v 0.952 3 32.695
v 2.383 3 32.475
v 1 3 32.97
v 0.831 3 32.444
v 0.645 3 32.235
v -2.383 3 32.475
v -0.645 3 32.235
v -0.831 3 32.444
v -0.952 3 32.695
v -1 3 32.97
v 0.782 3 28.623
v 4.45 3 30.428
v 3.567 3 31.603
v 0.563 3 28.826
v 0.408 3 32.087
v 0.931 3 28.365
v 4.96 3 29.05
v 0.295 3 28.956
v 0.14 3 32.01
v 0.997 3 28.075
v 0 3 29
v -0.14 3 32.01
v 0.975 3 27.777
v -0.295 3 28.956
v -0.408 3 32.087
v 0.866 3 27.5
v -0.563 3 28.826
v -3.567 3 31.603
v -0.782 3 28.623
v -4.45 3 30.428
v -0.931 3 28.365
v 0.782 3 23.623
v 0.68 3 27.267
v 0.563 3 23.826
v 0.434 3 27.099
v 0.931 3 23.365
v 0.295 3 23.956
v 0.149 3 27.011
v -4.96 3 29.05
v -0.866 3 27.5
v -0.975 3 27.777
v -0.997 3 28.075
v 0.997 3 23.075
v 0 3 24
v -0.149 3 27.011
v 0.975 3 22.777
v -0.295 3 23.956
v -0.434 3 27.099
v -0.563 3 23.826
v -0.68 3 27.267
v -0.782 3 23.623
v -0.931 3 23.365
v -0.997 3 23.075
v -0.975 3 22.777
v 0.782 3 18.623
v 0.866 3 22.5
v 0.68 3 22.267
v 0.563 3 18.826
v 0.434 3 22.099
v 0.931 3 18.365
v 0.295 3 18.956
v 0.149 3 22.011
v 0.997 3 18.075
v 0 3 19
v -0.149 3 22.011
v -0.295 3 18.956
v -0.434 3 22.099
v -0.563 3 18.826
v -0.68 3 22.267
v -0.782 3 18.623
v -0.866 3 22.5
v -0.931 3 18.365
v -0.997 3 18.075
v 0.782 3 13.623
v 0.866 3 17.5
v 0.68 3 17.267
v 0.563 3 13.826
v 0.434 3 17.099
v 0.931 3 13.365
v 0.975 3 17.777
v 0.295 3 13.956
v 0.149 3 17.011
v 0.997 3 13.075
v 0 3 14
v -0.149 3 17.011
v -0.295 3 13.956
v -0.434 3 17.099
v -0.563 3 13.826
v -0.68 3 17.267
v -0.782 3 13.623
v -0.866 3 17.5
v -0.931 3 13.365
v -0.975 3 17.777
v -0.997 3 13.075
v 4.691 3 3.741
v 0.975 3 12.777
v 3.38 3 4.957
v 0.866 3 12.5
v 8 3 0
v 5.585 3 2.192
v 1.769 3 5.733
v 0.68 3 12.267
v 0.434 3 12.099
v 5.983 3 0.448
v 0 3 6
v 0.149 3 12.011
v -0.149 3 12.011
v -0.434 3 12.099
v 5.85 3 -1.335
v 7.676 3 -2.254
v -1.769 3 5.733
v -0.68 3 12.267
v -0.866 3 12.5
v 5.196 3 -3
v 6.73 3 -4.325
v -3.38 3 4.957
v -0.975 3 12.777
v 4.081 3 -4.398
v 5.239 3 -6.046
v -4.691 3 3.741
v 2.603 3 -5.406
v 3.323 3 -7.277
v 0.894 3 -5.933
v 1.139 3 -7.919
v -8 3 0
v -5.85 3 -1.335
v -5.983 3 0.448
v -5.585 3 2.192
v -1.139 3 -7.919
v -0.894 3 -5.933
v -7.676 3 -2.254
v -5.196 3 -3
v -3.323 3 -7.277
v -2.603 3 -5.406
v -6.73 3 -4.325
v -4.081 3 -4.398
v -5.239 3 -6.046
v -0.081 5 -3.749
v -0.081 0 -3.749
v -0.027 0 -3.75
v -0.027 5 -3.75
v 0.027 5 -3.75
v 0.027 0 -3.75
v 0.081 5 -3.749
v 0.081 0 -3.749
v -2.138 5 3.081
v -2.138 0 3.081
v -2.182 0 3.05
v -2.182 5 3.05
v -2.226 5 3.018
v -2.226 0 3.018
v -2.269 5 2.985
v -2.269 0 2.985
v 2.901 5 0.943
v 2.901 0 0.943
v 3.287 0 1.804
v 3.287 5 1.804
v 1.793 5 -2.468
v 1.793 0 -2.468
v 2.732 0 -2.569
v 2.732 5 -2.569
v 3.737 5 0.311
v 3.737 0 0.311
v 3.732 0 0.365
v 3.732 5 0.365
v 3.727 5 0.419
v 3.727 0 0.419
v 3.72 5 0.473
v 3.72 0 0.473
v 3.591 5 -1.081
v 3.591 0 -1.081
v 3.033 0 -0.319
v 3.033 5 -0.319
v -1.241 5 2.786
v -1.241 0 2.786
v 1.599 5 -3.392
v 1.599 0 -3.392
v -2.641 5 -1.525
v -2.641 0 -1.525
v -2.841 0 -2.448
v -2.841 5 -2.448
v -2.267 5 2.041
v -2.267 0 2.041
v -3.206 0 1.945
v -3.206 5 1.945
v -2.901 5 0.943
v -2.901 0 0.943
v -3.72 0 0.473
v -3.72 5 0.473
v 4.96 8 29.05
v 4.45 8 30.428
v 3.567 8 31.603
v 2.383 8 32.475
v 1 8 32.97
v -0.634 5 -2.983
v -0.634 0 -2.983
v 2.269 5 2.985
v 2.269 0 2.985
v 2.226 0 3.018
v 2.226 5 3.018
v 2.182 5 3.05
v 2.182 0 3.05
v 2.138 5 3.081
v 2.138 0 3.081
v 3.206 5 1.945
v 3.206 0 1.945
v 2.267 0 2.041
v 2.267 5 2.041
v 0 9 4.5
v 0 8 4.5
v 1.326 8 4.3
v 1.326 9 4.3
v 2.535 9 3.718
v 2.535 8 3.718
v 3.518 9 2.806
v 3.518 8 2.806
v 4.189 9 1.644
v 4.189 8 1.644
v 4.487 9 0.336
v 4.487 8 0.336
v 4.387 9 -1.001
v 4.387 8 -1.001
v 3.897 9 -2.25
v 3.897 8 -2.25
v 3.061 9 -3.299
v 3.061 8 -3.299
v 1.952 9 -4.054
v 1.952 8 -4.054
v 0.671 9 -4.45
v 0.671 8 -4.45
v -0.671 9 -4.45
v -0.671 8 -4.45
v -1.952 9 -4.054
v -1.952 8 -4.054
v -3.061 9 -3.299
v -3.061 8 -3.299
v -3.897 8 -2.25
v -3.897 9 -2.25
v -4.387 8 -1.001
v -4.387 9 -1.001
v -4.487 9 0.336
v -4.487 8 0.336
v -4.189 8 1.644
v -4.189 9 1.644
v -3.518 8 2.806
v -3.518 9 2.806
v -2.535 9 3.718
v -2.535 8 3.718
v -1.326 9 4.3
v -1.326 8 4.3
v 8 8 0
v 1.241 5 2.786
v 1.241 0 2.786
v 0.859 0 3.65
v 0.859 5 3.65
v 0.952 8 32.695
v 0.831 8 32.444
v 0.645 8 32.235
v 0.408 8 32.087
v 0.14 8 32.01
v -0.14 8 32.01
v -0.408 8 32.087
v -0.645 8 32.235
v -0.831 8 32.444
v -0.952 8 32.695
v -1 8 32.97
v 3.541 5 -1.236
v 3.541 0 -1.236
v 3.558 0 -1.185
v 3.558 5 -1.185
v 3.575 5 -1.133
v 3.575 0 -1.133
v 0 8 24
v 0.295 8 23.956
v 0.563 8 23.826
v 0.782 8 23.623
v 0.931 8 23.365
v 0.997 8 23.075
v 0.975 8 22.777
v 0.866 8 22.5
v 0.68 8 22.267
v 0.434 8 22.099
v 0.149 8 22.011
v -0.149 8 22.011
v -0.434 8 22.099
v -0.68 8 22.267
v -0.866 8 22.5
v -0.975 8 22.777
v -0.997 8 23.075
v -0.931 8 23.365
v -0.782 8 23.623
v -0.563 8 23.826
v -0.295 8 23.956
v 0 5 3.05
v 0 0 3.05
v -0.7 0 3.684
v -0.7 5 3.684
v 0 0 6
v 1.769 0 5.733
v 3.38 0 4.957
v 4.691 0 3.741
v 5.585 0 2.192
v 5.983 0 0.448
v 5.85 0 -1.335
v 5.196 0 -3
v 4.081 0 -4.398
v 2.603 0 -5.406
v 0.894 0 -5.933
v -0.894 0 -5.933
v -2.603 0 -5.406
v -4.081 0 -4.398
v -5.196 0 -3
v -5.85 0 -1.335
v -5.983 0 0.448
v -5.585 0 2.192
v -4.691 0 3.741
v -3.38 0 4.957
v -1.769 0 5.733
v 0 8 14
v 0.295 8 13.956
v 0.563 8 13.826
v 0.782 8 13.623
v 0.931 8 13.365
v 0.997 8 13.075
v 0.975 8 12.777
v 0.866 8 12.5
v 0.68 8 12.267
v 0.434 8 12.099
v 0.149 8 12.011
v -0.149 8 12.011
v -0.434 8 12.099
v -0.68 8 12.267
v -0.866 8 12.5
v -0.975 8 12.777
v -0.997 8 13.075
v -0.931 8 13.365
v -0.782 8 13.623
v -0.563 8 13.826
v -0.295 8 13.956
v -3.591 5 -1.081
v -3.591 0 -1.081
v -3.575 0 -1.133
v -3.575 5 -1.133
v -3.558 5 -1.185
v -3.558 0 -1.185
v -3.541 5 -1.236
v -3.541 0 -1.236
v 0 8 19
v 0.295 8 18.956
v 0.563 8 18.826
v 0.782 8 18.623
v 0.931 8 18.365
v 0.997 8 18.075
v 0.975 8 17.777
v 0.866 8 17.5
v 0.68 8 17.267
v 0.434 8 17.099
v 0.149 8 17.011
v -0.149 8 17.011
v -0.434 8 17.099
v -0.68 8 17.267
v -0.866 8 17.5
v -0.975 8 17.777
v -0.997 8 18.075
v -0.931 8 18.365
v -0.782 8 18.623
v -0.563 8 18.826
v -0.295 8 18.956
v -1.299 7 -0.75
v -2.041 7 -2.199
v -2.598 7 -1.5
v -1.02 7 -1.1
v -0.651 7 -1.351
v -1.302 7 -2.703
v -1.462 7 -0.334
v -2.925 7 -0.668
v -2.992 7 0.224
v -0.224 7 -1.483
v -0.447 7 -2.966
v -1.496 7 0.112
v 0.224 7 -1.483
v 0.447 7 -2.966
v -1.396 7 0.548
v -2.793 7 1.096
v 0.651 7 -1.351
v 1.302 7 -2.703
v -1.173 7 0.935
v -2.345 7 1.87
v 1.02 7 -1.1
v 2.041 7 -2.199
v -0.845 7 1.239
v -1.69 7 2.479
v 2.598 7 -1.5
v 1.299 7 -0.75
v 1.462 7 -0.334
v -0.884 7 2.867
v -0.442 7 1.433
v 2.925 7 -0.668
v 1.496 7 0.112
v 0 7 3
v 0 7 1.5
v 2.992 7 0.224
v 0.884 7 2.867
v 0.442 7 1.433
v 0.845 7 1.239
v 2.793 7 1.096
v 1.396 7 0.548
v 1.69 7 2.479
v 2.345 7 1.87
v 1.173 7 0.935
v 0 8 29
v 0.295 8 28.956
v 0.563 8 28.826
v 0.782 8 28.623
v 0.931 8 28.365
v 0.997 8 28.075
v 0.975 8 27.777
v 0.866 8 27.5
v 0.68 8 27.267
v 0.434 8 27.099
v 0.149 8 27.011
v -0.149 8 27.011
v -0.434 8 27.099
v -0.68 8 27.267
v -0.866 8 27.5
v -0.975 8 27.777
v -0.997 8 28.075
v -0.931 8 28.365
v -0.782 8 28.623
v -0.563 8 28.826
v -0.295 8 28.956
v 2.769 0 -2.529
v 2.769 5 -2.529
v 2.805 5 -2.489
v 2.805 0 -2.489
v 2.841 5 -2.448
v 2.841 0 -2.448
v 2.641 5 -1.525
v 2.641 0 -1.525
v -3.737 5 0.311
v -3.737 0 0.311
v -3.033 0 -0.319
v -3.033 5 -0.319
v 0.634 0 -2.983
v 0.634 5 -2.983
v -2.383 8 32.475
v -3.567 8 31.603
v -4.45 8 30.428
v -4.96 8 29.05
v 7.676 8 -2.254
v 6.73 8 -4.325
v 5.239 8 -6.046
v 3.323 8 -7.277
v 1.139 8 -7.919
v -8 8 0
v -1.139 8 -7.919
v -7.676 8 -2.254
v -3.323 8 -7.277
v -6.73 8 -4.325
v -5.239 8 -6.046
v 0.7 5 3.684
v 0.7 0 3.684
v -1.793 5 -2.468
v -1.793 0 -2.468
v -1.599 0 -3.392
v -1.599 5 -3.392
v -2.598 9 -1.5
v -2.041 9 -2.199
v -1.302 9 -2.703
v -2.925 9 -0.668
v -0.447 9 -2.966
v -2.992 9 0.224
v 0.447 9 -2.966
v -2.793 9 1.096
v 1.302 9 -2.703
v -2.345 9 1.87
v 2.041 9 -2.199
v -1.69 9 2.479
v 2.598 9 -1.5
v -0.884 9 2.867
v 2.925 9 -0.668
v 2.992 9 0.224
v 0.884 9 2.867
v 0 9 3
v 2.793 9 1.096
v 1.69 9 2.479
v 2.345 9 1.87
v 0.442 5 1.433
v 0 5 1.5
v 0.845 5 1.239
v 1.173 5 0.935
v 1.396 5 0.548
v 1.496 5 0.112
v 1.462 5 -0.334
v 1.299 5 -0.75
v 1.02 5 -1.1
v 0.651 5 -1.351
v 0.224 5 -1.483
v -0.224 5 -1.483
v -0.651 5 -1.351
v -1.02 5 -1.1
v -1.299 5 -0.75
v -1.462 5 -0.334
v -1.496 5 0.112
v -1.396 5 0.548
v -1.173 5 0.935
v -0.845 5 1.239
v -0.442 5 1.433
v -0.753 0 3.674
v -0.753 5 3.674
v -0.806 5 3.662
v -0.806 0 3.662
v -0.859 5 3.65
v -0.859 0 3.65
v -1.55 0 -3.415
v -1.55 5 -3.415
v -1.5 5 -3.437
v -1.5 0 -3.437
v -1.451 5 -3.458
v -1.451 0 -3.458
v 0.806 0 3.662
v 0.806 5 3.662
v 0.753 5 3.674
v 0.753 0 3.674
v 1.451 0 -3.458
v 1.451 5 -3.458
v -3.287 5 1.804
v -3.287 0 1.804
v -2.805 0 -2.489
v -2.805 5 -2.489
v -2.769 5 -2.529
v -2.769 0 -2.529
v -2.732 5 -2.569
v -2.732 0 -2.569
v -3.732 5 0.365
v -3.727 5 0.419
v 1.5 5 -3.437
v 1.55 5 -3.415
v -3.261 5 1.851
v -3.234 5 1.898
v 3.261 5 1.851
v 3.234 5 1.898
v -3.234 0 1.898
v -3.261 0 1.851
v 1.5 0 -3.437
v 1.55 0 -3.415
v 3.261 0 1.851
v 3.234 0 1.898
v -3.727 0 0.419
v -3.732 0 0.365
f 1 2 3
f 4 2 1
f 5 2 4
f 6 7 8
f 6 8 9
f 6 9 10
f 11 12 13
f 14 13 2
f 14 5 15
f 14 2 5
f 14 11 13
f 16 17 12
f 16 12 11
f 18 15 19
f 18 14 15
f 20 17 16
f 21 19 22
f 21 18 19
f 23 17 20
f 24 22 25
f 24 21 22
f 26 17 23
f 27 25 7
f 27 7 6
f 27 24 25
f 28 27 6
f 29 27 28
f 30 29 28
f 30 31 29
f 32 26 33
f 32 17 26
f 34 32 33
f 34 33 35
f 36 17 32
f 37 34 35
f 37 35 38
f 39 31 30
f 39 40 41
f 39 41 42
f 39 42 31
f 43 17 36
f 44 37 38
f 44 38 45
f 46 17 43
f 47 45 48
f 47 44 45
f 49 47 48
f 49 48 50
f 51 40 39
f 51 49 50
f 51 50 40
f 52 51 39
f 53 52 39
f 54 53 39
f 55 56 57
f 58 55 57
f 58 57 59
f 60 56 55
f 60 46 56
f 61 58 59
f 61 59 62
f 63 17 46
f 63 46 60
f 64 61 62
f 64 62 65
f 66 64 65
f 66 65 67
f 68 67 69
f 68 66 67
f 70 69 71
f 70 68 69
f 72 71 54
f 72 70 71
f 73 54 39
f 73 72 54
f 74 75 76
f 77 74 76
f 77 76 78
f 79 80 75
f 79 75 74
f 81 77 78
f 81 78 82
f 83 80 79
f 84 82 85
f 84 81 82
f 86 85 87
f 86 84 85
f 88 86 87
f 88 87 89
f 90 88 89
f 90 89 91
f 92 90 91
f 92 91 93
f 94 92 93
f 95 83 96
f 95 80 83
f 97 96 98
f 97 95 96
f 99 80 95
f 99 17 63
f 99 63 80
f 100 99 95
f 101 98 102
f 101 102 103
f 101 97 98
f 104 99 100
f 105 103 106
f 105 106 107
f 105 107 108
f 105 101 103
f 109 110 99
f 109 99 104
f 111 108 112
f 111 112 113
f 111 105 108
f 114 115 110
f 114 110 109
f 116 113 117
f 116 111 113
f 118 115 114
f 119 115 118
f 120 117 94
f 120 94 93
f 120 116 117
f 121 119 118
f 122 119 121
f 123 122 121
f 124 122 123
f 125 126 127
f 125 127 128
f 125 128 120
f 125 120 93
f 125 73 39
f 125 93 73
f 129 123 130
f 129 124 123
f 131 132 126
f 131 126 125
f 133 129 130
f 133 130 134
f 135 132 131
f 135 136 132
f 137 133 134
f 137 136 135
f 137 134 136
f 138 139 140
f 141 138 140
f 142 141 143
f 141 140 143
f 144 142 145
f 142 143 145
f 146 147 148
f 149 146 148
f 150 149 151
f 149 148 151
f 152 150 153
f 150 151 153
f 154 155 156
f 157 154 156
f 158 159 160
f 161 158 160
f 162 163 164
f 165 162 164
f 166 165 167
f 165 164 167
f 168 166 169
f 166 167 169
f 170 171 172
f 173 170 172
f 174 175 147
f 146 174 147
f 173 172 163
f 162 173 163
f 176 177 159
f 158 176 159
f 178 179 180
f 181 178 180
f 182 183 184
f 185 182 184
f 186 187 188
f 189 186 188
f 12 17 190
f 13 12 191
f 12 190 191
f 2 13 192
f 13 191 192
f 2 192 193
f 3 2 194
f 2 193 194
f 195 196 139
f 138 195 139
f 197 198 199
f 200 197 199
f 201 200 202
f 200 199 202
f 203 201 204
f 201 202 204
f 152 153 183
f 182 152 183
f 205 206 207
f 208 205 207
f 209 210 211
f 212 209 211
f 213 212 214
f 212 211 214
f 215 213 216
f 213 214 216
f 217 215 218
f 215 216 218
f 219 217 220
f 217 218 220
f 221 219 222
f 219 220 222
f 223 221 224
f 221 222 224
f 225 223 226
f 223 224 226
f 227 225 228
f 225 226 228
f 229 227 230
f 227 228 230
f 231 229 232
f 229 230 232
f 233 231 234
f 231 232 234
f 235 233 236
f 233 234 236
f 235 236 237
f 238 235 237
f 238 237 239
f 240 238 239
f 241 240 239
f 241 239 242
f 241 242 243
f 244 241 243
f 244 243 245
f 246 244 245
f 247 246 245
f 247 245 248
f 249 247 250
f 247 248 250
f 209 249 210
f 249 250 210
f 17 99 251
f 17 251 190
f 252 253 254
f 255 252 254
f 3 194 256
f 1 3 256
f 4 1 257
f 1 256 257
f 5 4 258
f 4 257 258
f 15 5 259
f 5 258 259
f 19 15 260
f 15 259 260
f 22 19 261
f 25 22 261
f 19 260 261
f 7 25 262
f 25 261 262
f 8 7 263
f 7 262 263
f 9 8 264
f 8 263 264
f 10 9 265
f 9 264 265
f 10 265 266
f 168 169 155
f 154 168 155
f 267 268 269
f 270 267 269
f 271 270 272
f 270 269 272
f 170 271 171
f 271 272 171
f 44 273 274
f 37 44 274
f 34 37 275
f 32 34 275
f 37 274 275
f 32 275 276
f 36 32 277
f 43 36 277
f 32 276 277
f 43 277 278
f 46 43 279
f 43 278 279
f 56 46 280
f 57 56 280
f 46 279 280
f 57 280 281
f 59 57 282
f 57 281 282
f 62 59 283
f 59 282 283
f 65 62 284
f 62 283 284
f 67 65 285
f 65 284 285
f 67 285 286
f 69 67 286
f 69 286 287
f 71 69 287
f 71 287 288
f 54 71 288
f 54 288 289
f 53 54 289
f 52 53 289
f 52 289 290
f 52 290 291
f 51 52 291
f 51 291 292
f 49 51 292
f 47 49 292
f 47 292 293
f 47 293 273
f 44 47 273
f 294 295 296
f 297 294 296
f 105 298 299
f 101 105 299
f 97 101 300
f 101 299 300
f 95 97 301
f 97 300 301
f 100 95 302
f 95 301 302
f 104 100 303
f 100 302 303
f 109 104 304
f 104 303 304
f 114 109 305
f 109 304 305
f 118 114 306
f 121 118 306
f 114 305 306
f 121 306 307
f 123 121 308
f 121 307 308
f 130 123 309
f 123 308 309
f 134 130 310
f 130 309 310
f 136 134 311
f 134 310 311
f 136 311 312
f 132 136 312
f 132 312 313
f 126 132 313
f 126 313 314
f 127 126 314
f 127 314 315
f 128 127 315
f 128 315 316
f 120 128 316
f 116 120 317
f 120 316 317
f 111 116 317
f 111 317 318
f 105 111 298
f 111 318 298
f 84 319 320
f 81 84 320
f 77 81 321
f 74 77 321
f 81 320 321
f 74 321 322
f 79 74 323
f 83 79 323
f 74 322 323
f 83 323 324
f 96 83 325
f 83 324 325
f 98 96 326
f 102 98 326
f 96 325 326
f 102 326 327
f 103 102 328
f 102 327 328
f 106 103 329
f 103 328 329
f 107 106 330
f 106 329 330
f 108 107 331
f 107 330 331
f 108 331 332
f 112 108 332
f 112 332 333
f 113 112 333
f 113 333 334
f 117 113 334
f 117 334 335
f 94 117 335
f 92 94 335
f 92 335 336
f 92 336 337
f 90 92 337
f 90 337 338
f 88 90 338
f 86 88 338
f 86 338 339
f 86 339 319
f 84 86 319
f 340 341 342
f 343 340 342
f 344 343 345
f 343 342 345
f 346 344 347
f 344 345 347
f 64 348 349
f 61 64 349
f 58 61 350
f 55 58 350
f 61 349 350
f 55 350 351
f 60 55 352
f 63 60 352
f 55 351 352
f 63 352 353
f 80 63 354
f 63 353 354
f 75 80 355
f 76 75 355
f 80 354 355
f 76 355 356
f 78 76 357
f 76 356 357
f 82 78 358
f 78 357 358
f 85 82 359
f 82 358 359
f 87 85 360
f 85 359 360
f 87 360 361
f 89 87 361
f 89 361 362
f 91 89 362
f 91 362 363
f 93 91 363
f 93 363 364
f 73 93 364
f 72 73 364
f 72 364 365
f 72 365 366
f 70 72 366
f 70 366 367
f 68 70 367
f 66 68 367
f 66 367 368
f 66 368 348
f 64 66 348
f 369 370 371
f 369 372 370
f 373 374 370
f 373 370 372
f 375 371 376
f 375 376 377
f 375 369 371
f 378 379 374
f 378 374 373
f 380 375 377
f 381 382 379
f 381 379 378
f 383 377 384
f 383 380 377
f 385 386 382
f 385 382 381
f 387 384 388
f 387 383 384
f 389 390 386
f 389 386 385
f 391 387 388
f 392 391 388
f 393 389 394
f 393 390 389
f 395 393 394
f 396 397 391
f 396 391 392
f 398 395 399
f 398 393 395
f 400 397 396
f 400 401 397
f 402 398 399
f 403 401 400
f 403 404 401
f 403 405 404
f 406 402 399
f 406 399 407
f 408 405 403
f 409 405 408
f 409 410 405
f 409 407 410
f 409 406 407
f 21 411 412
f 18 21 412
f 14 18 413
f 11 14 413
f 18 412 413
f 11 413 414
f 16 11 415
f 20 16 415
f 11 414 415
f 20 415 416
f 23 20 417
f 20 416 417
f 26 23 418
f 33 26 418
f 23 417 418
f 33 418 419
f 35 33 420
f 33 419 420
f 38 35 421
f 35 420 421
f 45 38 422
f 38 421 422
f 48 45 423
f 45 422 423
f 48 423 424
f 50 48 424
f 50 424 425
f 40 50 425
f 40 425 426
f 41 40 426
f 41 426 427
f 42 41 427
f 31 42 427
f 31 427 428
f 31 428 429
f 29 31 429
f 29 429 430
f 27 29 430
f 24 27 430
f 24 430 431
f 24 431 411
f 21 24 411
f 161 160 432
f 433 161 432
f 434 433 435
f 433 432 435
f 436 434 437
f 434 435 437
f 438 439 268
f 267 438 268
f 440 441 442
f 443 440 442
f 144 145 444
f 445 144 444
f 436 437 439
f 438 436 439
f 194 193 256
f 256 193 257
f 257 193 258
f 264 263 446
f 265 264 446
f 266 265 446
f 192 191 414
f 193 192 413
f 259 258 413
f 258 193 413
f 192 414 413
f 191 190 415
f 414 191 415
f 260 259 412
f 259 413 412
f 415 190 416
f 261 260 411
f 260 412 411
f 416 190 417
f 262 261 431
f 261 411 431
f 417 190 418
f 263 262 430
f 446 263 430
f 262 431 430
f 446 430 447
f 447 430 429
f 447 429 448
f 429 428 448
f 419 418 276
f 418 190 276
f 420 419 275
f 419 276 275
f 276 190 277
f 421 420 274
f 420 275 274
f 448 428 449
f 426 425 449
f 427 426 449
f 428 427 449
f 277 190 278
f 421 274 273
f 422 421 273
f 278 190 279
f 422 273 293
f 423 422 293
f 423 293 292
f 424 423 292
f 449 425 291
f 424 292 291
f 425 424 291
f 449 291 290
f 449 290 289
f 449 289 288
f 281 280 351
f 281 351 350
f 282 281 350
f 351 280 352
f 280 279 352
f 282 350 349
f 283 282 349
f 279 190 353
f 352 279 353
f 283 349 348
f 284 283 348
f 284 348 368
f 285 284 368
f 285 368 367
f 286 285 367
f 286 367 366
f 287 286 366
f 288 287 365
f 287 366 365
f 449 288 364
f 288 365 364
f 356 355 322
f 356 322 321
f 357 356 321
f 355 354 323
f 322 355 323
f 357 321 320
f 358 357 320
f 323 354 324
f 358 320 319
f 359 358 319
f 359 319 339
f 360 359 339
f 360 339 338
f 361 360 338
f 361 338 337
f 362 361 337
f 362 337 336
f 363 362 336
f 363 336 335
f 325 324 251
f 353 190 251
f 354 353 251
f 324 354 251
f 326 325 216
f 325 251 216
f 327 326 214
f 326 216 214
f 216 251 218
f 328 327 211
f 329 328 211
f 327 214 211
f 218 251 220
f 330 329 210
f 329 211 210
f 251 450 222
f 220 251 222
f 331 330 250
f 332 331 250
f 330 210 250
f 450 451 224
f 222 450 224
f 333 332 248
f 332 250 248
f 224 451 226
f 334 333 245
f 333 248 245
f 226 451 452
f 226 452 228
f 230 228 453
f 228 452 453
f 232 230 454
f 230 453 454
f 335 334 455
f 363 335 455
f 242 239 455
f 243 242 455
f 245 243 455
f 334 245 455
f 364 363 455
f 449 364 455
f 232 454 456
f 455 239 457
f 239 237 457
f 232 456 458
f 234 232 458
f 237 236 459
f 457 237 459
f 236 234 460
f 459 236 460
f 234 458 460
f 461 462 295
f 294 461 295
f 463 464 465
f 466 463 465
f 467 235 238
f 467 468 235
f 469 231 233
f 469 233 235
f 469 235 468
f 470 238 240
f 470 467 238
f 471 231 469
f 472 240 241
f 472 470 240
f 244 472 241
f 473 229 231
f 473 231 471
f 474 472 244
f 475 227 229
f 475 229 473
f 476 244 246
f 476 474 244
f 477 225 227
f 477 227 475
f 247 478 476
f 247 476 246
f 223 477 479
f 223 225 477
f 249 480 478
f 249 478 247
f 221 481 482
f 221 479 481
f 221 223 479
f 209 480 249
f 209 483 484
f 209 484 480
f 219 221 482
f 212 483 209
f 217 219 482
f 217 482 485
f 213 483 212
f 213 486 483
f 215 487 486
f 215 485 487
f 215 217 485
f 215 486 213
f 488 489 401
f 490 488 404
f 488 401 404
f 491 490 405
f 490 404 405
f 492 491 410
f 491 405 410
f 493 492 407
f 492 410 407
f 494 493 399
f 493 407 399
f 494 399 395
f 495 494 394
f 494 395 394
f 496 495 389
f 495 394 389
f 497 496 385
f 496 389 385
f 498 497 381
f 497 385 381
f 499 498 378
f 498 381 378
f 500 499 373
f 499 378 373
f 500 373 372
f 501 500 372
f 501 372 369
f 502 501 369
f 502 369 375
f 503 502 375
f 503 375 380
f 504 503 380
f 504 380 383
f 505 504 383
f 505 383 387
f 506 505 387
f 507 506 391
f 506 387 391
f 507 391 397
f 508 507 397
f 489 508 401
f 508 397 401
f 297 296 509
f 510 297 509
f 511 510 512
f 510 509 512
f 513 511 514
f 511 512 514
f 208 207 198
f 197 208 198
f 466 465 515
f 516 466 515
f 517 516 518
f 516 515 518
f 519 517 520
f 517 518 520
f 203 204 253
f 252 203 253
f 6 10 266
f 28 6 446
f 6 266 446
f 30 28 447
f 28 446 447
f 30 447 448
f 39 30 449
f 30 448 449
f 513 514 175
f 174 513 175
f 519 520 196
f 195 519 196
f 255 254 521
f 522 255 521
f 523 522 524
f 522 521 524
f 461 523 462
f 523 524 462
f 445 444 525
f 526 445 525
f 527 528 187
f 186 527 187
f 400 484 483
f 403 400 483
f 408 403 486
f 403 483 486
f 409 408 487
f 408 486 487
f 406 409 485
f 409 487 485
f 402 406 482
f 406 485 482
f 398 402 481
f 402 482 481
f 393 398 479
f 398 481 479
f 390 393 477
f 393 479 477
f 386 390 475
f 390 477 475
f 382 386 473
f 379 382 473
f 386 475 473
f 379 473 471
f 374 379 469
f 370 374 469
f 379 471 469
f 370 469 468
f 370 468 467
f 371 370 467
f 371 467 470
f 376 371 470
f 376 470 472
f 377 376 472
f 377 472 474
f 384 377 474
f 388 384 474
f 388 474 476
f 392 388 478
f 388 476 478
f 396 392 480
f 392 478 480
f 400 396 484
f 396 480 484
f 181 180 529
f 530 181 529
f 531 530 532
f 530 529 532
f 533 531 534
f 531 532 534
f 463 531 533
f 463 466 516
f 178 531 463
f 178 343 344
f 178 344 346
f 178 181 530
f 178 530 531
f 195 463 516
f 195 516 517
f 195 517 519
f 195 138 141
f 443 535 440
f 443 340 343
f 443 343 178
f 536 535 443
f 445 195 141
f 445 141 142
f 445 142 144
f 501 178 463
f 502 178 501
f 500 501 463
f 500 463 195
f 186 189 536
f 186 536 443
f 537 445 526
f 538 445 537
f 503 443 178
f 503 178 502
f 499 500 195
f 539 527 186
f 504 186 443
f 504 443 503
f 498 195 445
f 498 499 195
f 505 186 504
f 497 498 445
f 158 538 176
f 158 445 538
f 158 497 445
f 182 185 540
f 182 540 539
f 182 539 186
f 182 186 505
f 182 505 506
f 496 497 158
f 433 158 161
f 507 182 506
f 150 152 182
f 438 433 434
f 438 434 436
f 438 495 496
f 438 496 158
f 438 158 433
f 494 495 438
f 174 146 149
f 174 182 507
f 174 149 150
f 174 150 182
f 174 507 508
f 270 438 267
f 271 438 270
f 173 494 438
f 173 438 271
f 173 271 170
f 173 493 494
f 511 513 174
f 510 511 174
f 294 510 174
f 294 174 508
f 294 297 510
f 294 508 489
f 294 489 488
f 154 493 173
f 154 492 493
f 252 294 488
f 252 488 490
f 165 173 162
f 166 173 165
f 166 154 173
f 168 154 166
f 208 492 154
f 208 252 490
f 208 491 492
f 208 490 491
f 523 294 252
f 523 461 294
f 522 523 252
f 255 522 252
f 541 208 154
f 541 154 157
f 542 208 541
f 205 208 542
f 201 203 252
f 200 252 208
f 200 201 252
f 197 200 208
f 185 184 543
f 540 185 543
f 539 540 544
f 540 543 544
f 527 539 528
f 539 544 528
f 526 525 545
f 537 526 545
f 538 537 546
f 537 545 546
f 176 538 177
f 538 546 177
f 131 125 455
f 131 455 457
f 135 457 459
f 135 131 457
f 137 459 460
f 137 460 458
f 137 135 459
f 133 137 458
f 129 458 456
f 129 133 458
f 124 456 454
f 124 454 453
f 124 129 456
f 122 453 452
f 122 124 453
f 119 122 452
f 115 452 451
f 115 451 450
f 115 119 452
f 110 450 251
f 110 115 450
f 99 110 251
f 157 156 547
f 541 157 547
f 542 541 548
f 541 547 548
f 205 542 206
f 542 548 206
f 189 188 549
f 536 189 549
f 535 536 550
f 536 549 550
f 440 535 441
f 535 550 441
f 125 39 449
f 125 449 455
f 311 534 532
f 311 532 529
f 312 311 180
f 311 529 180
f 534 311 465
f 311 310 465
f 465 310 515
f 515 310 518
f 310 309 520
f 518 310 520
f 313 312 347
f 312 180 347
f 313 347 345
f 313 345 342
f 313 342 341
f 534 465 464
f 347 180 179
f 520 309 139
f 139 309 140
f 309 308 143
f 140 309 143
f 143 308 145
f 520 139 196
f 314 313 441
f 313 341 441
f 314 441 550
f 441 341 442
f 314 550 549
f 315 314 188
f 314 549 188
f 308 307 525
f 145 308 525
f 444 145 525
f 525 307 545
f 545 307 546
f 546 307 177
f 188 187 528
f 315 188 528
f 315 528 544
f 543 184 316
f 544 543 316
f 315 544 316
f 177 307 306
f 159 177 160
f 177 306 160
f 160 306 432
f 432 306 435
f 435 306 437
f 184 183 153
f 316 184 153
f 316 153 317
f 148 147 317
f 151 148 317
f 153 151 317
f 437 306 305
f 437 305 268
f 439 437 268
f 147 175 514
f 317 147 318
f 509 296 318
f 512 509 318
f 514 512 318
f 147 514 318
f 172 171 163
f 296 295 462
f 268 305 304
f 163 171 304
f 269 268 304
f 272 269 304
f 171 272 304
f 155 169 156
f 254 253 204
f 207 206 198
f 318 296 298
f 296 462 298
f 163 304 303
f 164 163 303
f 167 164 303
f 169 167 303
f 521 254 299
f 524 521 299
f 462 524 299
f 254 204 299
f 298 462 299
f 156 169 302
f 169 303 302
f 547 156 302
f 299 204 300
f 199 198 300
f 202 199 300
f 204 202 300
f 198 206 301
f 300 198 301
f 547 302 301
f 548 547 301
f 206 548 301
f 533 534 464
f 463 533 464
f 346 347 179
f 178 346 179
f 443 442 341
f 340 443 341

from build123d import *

# Parameters (mm, degrees)
SKETCH1_R           = 6
BOSS_EXTRUDE1_DEPTH = 3
CUT_EXTRUDE4_DEPTH  = 10
BOSS_EXTRUDE2_DEPTH = 5
SKETCH3_R           = 4.5
BOSS_EXTRUDE3_DEPTH = 1
SKETCH4_R           = 3
CUT_EXTRUDE1_DEPTH  = 2
SKETCH5_R           = 1.5
CUT_EXTRUDE2_DEPTH  = 48.699580711
SKETCH6_R           = 1
CUT_EXTRUDE3_DEPTH  = 10
SKETCH8_R           = 1.5
CUT_EXTRUDE5_DEPTH  = 2
SKETCH9_R           = 1
CUT_EXTRUDE6_DEPTH  = 10


with BuildPart() as part:
    # Sketch1 → Boss-Extrude1 (new body)
    with BuildSketch(Plane(origin=(0, 0, 0), x_dir=(1, 0, 0), z_dir=(0, 1, 0))):
        with Locations(Location((0, 0, 0), (0, 0, 270))):
            Circle(SKETCH1_R)
    extrude(amount=BOSS_EXTRUDE1_DEPTH)

    # Sketch7 → Cut-Extrude4 (cut, through all)
    with BuildSketch(Plane.XZ):
        with BuildLine():
            Line((0.7, 3.684087404), (0, 3.05))
            Line((0, 3.05), (-0.7, 3.684087404))
            ThreePointArc((-0.7, 3.684087404), (-0.779668841, 3.668053503), (-0.858971523, 3.650296964))
            Line((-0.858971523, 3.650296964), (-1.240546761, 2.786313646))
            Line((-1.240546761, 2.786313646), (-2.137935164, 3.080865663))
            ThreePointArc((-2.137935164, 3.080865663), (-2.204194696, 3.033813729), (-2.269419066, 2.985337016))
            Line((-2.269419066, 2.985337016), (-2.266591718, 2.040848349))
            Line((-2.266591718, 2.040848349), (-3.206201915, 1.944934261))
            ThreePointArc((-3.206201915, 1.944934261), (-3.247595264, 1.875), (-3.287463436, 1.804185178))
            Line((-3.287463436, 1.804185178), (-2.900722375, 0.942501833))
            Line((-2.900722375, 0.942501833), (-3.720087228, 0.472706055))
            ThreePointArc((-3.720087228, 0.472706055), (-3.729457108, 0.391981737), (-3.737075512, 0.311073332))
            Line((-3.737075512, 0.311073332), (-3.033291781, -0.318811813))
            Line((-3.033291781, -0.318811813), (-3.590735663, -1.081257322))
            ThreePointArc((-3.590735663, -1.081257322), (-3.566461936, -1.158813729), (-3.540513282, -1.235825919))
            Line((-3.540513282, -1.235825919), (-2.641377482, -1.525))
            Line((-2.641377482, -1.525), (-2.840513282, -2.448261485))
            ThreePointArc((-2.840513282, -2.448261485), (-2.786793096, -2.509239774), (-2.73176414, -2.569039642))
            Line((-2.73176414, -2.569039642), (-1.792745019, -2.467501833))
            Line((-1.792745019, -2.467501833), (-1.599140348, -3.391938995))
            ThreePointArc((-1.599140348, -3.391938995), (-1.525262412, -3.425795466), (-1.450668162, -3.458043072))
            Line((-1.450668162, -3.458043072), (-0.634130657, -2.983350182))
            Line((-0.634130657, -2.983350182), (-0.081261521, -3.749119439))
            ThreePointArc((-0.081261521, -3.749119439), (0, -3.75), (0.081261521, -3.749119439))
            Line((0.081261521, -3.749119439), (0.634130657, -2.983350182))
            Line((0.634130657, -2.983350182), (1.450668162, -3.458043072))
            ThreePointArc((1.450668162, -3.458043072), (1.525262412, -3.425795466), (1.599140348, -3.391938995))
            Line((1.599140348, -3.391938995), (1.792745019, -2.467501833))
            Line((1.792745019, -2.467501833), (2.73176414, -2.569039642))
            ThreePointArc((2.73176414, -2.569039642), (2.786793096, -2.509239774), (2.840513282, -2.448261485))
            Line((2.840513282, -2.448261485), (2.641377482, -1.525))
            Line((2.641377482, -1.525), (3.540513282, -1.235825919))
            ThreePointArc((3.540513282, -1.235825919), (3.566461936, -1.158813729), (3.590735663, -1.081257322))
            Line((3.590735663, -1.081257322), (3.033291781, -0.318811813))
            Line((3.033291781, -0.318811813), (3.737075512, 0.311073332))
            ThreePointArc((3.737075512, 0.311073332), (3.729457108, 0.391981737), (3.720087228, 0.472706055))
            Line((3.720087228, 0.472706055), (2.900722375, 0.942501833))
            Line((2.900722375, 0.942501833), (3.287463436, 1.804185178))
            ThreePointArc((3.287463436, 1.804185178), (3.247595264, 1.875), (3.206201915, 1.944934261))
            Line((3.206201915, 1.944934261), (2.266591718, 2.040848349))
            Line((2.266591718, 2.040848349), (2.269419066, 2.985337016))
            ThreePointArc((2.269419066, 2.985337016), (2.204194696, 3.033813729), (2.137935164, 3.080865663))
            Line((2.137935164, 3.080865663), (1.240546761, 2.786313646))
            Line((1.240546761, 2.786313646), (0.858971523, 3.650296964))
            ThreePointArc((0.858971523, 3.650296964), (0.779668841, 3.668053503), (0.7, 3.684087404))
        make_face()
    extrude(amount=-CUT_EXTRUDE4_DEPTH, mode=Mode.SUBTRACT)

    # Sketch2 → Boss-Extrude2 (add)
    with BuildSketch(Plane(origin=(0, 3, 0), x_dir=(1, 0, 0), z_dir=(0, 1, 0))):
        with BuildLine():
            Line((8, 0), (3.5, -43))
            ThreePointArc((3.5, -43), (0, -46.5), (-3.5, -43))
            Line((-3.5, -43), (-8, 0))
            ThreePointArc((-8, 0), (0, 8), (8, 0))
        make_face()
    extrude(amount=BOSS_EXTRUDE2_DEPTH)

    # Sketch3 → Boss-Extrude3 (add)
    with BuildSketch(Plane(origin=(0, 8, 0), x_dir=(1, 0, 0), z_dir=(0, 1, 0))):
        with Locations(Location((0, 0, 0), (0, 0, 270))):
            Circle(SKETCH3_R)
    extrude(amount=BOSS_EXTRUDE3_DEPTH)

    # Sketch4 → Cut-Extrude1 (cut)
    with BuildSketch(Plane(origin=(0, 9, 0), x_dir=(1, 0, 0), z_dir=(0, 1, 0))):
        with Locations(Location((0, 0, 0), (0, 0, 270))):
            Circle(SKETCH4_R)
    extrude(amount=-CUT_EXTRUDE1_DEPTH, mode=Mode.SUBTRACT)

    # Sketch5 → Cut-Extrude2 (cut, through all)
    with BuildSketch(Plane(origin=(0, 7, 0), x_dir=(1, 0, 0), z_dir=(0, 1, 0))):
        with Locations(Location((0, 0, 0), (0, 0, 270))):
            Circle(SKETCH5_R)
    extrude(amount=-CUT_EXTRUDE2_DEPTH, mode=Mode.SUBTRACT)

    # Sketch6 → Cut-Extrude3 (cut)
    with BuildSketch(Plane(origin=(0, 8, 0), x_dir=(1, 0, 0), z_dir=(0, 1, 0))):
        with Locations(Location((0, -13, 0), (0, 0, 270))):
            Circle(SKETCH6_R)
        with Locations(Location((0, -18, 0), (0, 0, 270))):
            Circle(SKETCH6_R)
        with Locations(Location((0, -23, 0), (0, 0, 270))):
            Circle(SKETCH6_R)
        with Locations(Location((0, -28, 0), (0, 0, 270))):
            Circle(SKETCH6_R)
        with Locations(Location((0, -33, 0), (0, 0, 270))):
            Circle(SKETCH6_R)
        with Locations(Location((0, -38, 0), (0, 0, 270))):
            Circle(SKETCH6_R)
        with Locations(Location((0, -43, 0), (0, 0, 270))):
            Circle(SKETCH6_R)
    extrude(amount=-CUT_EXTRUDE3_DEPTH, mode=Mode.SUBTRACT)

    # Sketch8 → Cut-Extrude5 (cut)
    with BuildSketch(Plane.XZ.offset(-3)):
        with BuildLine():
            Line((-0.858971523, 3.650296964), (-1.240546761, 2.786313646))
            Line((-1.240546761, 2.786313646), (-2.137935164, 3.080865663))
            ThreePointArc((-2.137935164, 3.080865663), (-2.204194696, 3.033813729), (-2.269419066, 2.985337016))
            Line((-2.269419066, 2.985337016), (-2.266591718, 2.040848349))
            Line((-2.266591718, 2.040848349), (-3.206201915, 1.944934261))
            ThreePointArc((-3.206201915, 1.944934261), (-3.247595264, 1.875), (-3.287463436, 1.804185178))
            Line((-3.287463436, 1.804185178), (-2.900722375, 0.942501833))
            Line((-2.900722375, 0.942501833), (-3.720087228, 0.472706055))
            ThreePointArc((-3.720087228, 0.472706055), (-3.729457108, 0.391981737), (-3.737075512, 0.311073332))
            Line((-3.737075512, 0.311073332), (-3.033291781, -0.318811813))
            Line((-3.033291781, -0.318811813), (-3.590735663, -1.081257322))
            ThreePointArc((-3.590735663, -1.081257322), (-3.566461936, -1.158813729), (-3.540513282, -1.235825919))
            Line((-3.540513282, -1.235825919), (-2.641377482, -1.525))
            Line((-2.641377482, -1.525), (-2.840513282, -2.448261485))
            ThreePointArc((-2.840513282, -2.448261485), (-2.786793096, -2.509239774), (-2.73176414, -2.569039642))
            Line((-2.73176414, -2.569039642), (-1.792745019, -2.467501833))
            Line((-1.792745019, -2.467501833), (-1.599140348, -3.391938995))
            ThreePointArc((-1.599140348, -3.391938995), (-1.525262412, -3.425795466), (-1.450668162, -3.458043072))
            Line((-1.450668162, -3.458043072), (-0.634130657, -2.983350182))
            Line((-0.634130657, -2.983350182), (-0.081261521, -3.749119439))
            ThreePointArc((-0.081261521, -3.749119439), (0, -3.75), (0.081261521, -3.749119439))
            Line((0.081261521, -3.749119439), (0.634130657, -2.983350182))
            Line((0.634130657, -2.983350182), (1.450668162, -3.458043072))
            ThreePointArc((1.450668162, -3.458043072), (1.525262412, -3.425795466), (1.599140348, -3.391938995))
            Line((1.599140348, -3.391938995), (1.792745019, -2.467501833))
            Line((1.792745019, -2.467501833), (2.73176414, -2.569039642))
            ThreePointArc((2.73176414, -2.569039642), (2.786793096, -2.509239774), (2.840513282, -2.448261485))
            Line((2.840513282, -2.448261485), (2.641377482, -1.525))
            Line((2.641377482, -1.525), (3.540513282, -1.235825919))
            ThreePointArc((3.540513282, -1.235825919), (3.566461936, -1.158813729), (3.590735663, -1.081257322))
            Line((3.590735663, -1.081257322), (3.033291781, -0.318811813))
            Line((3.033291781, -0.318811813), (3.737075512, 0.311073332))
            ThreePointArc((3.737075512, 0.311073332), (3.729457108, 0.391981737), (3.720087228, 0.472706055))
            Line((3.720087228, 0.472706055), (2.900722375, 0.942501833))
            Line((2.900722375, 0.942501833), (3.287463436, 1.804185178))
            ThreePointArc((3.287463436, 1.804185178), (3.247595264, 1.875), (3.206201915, 1.944934261))
            Line((3.206201915, 1.944934261), (2.266591718, 2.040848349))
            Line((2.266591718, 2.040848349), (2.269419066, 2.985337016))
            ThreePointArc((2.269419066, 2.985337016), (2.204194696, 3.033813729), (2.137935164, 3.080865663))
            Line((2.137935164, 3.080865663), (1.240546761, 2.786313646))
            Line((1.240546761, 2.786313646), (0.858971523, 3.650296964))
            ThreePointArc((0.858971523, 3.650296964), (0.779668841, 3.668053503), (0.7, 3.684087404))
            Line((0.7, 3.684087404), (0, 3.05))
            Line((0, 3.05), (-0.7, 3.684087404))
            ThreePointArc((-0.7, 3.684087404), (-0.779668841, 3.668053503), (-0.858971523, 3.650296964))
        make_face()
        with Locations(Location((0, 0, 0), (0, 0, 90))):
            Circle(SKETCH8_R, mode=Mode.SUBTRACT)
    extrude(amount=-CUT_EXTRUDE5_DEPTH, mode=Mode.SUBTRACT)

    # Sketch9 → Cut-Extrude6 (cut)
    with BuildSketch(Plane(origin=(0, 8, 0), x_dir=(1, 0, 0), z_dir=(0, 1, 0))):
        with BuildLine():
            ThreePointArc((-0.999557496, -32.970254191), (-3.566749104, -31.602893663), (-4.959923611, -29.049618831))
            Line((-4.959923611, -29.049618831), (-3.5, -43))
            ThreePointArc((-3.5, -43), (0, -46.5), (3.5, -43))
            Line((3.5, -43), (4.959923611, -29.049618831))
            ThreePointArc((4.959923611, -29.049618831), (3.566749104, -31.602893663), (0.999557496, -32.970254191))
            ThreePointArc((0.999557496, -32.970254191), (0.999889368, -32.98512545), (1, -33))
            ThreePointArc((1, -33), (-0.01487455, -33.999889368), (-0.999557496, -32.970254191))
        make_face()
        with Locations((0, -43)):
            Circle(SKETCH9_R, mode=Mode.SUBTRACT)
        with Locations((0, -38)):
            Circle(SKETCH9_R, mode=Mode.SUBTRACT)
    extrude(amount=-CUT_EXTRUDE6_DEPTH, mode=Mode.SUBTRACT)


solid = part.part
